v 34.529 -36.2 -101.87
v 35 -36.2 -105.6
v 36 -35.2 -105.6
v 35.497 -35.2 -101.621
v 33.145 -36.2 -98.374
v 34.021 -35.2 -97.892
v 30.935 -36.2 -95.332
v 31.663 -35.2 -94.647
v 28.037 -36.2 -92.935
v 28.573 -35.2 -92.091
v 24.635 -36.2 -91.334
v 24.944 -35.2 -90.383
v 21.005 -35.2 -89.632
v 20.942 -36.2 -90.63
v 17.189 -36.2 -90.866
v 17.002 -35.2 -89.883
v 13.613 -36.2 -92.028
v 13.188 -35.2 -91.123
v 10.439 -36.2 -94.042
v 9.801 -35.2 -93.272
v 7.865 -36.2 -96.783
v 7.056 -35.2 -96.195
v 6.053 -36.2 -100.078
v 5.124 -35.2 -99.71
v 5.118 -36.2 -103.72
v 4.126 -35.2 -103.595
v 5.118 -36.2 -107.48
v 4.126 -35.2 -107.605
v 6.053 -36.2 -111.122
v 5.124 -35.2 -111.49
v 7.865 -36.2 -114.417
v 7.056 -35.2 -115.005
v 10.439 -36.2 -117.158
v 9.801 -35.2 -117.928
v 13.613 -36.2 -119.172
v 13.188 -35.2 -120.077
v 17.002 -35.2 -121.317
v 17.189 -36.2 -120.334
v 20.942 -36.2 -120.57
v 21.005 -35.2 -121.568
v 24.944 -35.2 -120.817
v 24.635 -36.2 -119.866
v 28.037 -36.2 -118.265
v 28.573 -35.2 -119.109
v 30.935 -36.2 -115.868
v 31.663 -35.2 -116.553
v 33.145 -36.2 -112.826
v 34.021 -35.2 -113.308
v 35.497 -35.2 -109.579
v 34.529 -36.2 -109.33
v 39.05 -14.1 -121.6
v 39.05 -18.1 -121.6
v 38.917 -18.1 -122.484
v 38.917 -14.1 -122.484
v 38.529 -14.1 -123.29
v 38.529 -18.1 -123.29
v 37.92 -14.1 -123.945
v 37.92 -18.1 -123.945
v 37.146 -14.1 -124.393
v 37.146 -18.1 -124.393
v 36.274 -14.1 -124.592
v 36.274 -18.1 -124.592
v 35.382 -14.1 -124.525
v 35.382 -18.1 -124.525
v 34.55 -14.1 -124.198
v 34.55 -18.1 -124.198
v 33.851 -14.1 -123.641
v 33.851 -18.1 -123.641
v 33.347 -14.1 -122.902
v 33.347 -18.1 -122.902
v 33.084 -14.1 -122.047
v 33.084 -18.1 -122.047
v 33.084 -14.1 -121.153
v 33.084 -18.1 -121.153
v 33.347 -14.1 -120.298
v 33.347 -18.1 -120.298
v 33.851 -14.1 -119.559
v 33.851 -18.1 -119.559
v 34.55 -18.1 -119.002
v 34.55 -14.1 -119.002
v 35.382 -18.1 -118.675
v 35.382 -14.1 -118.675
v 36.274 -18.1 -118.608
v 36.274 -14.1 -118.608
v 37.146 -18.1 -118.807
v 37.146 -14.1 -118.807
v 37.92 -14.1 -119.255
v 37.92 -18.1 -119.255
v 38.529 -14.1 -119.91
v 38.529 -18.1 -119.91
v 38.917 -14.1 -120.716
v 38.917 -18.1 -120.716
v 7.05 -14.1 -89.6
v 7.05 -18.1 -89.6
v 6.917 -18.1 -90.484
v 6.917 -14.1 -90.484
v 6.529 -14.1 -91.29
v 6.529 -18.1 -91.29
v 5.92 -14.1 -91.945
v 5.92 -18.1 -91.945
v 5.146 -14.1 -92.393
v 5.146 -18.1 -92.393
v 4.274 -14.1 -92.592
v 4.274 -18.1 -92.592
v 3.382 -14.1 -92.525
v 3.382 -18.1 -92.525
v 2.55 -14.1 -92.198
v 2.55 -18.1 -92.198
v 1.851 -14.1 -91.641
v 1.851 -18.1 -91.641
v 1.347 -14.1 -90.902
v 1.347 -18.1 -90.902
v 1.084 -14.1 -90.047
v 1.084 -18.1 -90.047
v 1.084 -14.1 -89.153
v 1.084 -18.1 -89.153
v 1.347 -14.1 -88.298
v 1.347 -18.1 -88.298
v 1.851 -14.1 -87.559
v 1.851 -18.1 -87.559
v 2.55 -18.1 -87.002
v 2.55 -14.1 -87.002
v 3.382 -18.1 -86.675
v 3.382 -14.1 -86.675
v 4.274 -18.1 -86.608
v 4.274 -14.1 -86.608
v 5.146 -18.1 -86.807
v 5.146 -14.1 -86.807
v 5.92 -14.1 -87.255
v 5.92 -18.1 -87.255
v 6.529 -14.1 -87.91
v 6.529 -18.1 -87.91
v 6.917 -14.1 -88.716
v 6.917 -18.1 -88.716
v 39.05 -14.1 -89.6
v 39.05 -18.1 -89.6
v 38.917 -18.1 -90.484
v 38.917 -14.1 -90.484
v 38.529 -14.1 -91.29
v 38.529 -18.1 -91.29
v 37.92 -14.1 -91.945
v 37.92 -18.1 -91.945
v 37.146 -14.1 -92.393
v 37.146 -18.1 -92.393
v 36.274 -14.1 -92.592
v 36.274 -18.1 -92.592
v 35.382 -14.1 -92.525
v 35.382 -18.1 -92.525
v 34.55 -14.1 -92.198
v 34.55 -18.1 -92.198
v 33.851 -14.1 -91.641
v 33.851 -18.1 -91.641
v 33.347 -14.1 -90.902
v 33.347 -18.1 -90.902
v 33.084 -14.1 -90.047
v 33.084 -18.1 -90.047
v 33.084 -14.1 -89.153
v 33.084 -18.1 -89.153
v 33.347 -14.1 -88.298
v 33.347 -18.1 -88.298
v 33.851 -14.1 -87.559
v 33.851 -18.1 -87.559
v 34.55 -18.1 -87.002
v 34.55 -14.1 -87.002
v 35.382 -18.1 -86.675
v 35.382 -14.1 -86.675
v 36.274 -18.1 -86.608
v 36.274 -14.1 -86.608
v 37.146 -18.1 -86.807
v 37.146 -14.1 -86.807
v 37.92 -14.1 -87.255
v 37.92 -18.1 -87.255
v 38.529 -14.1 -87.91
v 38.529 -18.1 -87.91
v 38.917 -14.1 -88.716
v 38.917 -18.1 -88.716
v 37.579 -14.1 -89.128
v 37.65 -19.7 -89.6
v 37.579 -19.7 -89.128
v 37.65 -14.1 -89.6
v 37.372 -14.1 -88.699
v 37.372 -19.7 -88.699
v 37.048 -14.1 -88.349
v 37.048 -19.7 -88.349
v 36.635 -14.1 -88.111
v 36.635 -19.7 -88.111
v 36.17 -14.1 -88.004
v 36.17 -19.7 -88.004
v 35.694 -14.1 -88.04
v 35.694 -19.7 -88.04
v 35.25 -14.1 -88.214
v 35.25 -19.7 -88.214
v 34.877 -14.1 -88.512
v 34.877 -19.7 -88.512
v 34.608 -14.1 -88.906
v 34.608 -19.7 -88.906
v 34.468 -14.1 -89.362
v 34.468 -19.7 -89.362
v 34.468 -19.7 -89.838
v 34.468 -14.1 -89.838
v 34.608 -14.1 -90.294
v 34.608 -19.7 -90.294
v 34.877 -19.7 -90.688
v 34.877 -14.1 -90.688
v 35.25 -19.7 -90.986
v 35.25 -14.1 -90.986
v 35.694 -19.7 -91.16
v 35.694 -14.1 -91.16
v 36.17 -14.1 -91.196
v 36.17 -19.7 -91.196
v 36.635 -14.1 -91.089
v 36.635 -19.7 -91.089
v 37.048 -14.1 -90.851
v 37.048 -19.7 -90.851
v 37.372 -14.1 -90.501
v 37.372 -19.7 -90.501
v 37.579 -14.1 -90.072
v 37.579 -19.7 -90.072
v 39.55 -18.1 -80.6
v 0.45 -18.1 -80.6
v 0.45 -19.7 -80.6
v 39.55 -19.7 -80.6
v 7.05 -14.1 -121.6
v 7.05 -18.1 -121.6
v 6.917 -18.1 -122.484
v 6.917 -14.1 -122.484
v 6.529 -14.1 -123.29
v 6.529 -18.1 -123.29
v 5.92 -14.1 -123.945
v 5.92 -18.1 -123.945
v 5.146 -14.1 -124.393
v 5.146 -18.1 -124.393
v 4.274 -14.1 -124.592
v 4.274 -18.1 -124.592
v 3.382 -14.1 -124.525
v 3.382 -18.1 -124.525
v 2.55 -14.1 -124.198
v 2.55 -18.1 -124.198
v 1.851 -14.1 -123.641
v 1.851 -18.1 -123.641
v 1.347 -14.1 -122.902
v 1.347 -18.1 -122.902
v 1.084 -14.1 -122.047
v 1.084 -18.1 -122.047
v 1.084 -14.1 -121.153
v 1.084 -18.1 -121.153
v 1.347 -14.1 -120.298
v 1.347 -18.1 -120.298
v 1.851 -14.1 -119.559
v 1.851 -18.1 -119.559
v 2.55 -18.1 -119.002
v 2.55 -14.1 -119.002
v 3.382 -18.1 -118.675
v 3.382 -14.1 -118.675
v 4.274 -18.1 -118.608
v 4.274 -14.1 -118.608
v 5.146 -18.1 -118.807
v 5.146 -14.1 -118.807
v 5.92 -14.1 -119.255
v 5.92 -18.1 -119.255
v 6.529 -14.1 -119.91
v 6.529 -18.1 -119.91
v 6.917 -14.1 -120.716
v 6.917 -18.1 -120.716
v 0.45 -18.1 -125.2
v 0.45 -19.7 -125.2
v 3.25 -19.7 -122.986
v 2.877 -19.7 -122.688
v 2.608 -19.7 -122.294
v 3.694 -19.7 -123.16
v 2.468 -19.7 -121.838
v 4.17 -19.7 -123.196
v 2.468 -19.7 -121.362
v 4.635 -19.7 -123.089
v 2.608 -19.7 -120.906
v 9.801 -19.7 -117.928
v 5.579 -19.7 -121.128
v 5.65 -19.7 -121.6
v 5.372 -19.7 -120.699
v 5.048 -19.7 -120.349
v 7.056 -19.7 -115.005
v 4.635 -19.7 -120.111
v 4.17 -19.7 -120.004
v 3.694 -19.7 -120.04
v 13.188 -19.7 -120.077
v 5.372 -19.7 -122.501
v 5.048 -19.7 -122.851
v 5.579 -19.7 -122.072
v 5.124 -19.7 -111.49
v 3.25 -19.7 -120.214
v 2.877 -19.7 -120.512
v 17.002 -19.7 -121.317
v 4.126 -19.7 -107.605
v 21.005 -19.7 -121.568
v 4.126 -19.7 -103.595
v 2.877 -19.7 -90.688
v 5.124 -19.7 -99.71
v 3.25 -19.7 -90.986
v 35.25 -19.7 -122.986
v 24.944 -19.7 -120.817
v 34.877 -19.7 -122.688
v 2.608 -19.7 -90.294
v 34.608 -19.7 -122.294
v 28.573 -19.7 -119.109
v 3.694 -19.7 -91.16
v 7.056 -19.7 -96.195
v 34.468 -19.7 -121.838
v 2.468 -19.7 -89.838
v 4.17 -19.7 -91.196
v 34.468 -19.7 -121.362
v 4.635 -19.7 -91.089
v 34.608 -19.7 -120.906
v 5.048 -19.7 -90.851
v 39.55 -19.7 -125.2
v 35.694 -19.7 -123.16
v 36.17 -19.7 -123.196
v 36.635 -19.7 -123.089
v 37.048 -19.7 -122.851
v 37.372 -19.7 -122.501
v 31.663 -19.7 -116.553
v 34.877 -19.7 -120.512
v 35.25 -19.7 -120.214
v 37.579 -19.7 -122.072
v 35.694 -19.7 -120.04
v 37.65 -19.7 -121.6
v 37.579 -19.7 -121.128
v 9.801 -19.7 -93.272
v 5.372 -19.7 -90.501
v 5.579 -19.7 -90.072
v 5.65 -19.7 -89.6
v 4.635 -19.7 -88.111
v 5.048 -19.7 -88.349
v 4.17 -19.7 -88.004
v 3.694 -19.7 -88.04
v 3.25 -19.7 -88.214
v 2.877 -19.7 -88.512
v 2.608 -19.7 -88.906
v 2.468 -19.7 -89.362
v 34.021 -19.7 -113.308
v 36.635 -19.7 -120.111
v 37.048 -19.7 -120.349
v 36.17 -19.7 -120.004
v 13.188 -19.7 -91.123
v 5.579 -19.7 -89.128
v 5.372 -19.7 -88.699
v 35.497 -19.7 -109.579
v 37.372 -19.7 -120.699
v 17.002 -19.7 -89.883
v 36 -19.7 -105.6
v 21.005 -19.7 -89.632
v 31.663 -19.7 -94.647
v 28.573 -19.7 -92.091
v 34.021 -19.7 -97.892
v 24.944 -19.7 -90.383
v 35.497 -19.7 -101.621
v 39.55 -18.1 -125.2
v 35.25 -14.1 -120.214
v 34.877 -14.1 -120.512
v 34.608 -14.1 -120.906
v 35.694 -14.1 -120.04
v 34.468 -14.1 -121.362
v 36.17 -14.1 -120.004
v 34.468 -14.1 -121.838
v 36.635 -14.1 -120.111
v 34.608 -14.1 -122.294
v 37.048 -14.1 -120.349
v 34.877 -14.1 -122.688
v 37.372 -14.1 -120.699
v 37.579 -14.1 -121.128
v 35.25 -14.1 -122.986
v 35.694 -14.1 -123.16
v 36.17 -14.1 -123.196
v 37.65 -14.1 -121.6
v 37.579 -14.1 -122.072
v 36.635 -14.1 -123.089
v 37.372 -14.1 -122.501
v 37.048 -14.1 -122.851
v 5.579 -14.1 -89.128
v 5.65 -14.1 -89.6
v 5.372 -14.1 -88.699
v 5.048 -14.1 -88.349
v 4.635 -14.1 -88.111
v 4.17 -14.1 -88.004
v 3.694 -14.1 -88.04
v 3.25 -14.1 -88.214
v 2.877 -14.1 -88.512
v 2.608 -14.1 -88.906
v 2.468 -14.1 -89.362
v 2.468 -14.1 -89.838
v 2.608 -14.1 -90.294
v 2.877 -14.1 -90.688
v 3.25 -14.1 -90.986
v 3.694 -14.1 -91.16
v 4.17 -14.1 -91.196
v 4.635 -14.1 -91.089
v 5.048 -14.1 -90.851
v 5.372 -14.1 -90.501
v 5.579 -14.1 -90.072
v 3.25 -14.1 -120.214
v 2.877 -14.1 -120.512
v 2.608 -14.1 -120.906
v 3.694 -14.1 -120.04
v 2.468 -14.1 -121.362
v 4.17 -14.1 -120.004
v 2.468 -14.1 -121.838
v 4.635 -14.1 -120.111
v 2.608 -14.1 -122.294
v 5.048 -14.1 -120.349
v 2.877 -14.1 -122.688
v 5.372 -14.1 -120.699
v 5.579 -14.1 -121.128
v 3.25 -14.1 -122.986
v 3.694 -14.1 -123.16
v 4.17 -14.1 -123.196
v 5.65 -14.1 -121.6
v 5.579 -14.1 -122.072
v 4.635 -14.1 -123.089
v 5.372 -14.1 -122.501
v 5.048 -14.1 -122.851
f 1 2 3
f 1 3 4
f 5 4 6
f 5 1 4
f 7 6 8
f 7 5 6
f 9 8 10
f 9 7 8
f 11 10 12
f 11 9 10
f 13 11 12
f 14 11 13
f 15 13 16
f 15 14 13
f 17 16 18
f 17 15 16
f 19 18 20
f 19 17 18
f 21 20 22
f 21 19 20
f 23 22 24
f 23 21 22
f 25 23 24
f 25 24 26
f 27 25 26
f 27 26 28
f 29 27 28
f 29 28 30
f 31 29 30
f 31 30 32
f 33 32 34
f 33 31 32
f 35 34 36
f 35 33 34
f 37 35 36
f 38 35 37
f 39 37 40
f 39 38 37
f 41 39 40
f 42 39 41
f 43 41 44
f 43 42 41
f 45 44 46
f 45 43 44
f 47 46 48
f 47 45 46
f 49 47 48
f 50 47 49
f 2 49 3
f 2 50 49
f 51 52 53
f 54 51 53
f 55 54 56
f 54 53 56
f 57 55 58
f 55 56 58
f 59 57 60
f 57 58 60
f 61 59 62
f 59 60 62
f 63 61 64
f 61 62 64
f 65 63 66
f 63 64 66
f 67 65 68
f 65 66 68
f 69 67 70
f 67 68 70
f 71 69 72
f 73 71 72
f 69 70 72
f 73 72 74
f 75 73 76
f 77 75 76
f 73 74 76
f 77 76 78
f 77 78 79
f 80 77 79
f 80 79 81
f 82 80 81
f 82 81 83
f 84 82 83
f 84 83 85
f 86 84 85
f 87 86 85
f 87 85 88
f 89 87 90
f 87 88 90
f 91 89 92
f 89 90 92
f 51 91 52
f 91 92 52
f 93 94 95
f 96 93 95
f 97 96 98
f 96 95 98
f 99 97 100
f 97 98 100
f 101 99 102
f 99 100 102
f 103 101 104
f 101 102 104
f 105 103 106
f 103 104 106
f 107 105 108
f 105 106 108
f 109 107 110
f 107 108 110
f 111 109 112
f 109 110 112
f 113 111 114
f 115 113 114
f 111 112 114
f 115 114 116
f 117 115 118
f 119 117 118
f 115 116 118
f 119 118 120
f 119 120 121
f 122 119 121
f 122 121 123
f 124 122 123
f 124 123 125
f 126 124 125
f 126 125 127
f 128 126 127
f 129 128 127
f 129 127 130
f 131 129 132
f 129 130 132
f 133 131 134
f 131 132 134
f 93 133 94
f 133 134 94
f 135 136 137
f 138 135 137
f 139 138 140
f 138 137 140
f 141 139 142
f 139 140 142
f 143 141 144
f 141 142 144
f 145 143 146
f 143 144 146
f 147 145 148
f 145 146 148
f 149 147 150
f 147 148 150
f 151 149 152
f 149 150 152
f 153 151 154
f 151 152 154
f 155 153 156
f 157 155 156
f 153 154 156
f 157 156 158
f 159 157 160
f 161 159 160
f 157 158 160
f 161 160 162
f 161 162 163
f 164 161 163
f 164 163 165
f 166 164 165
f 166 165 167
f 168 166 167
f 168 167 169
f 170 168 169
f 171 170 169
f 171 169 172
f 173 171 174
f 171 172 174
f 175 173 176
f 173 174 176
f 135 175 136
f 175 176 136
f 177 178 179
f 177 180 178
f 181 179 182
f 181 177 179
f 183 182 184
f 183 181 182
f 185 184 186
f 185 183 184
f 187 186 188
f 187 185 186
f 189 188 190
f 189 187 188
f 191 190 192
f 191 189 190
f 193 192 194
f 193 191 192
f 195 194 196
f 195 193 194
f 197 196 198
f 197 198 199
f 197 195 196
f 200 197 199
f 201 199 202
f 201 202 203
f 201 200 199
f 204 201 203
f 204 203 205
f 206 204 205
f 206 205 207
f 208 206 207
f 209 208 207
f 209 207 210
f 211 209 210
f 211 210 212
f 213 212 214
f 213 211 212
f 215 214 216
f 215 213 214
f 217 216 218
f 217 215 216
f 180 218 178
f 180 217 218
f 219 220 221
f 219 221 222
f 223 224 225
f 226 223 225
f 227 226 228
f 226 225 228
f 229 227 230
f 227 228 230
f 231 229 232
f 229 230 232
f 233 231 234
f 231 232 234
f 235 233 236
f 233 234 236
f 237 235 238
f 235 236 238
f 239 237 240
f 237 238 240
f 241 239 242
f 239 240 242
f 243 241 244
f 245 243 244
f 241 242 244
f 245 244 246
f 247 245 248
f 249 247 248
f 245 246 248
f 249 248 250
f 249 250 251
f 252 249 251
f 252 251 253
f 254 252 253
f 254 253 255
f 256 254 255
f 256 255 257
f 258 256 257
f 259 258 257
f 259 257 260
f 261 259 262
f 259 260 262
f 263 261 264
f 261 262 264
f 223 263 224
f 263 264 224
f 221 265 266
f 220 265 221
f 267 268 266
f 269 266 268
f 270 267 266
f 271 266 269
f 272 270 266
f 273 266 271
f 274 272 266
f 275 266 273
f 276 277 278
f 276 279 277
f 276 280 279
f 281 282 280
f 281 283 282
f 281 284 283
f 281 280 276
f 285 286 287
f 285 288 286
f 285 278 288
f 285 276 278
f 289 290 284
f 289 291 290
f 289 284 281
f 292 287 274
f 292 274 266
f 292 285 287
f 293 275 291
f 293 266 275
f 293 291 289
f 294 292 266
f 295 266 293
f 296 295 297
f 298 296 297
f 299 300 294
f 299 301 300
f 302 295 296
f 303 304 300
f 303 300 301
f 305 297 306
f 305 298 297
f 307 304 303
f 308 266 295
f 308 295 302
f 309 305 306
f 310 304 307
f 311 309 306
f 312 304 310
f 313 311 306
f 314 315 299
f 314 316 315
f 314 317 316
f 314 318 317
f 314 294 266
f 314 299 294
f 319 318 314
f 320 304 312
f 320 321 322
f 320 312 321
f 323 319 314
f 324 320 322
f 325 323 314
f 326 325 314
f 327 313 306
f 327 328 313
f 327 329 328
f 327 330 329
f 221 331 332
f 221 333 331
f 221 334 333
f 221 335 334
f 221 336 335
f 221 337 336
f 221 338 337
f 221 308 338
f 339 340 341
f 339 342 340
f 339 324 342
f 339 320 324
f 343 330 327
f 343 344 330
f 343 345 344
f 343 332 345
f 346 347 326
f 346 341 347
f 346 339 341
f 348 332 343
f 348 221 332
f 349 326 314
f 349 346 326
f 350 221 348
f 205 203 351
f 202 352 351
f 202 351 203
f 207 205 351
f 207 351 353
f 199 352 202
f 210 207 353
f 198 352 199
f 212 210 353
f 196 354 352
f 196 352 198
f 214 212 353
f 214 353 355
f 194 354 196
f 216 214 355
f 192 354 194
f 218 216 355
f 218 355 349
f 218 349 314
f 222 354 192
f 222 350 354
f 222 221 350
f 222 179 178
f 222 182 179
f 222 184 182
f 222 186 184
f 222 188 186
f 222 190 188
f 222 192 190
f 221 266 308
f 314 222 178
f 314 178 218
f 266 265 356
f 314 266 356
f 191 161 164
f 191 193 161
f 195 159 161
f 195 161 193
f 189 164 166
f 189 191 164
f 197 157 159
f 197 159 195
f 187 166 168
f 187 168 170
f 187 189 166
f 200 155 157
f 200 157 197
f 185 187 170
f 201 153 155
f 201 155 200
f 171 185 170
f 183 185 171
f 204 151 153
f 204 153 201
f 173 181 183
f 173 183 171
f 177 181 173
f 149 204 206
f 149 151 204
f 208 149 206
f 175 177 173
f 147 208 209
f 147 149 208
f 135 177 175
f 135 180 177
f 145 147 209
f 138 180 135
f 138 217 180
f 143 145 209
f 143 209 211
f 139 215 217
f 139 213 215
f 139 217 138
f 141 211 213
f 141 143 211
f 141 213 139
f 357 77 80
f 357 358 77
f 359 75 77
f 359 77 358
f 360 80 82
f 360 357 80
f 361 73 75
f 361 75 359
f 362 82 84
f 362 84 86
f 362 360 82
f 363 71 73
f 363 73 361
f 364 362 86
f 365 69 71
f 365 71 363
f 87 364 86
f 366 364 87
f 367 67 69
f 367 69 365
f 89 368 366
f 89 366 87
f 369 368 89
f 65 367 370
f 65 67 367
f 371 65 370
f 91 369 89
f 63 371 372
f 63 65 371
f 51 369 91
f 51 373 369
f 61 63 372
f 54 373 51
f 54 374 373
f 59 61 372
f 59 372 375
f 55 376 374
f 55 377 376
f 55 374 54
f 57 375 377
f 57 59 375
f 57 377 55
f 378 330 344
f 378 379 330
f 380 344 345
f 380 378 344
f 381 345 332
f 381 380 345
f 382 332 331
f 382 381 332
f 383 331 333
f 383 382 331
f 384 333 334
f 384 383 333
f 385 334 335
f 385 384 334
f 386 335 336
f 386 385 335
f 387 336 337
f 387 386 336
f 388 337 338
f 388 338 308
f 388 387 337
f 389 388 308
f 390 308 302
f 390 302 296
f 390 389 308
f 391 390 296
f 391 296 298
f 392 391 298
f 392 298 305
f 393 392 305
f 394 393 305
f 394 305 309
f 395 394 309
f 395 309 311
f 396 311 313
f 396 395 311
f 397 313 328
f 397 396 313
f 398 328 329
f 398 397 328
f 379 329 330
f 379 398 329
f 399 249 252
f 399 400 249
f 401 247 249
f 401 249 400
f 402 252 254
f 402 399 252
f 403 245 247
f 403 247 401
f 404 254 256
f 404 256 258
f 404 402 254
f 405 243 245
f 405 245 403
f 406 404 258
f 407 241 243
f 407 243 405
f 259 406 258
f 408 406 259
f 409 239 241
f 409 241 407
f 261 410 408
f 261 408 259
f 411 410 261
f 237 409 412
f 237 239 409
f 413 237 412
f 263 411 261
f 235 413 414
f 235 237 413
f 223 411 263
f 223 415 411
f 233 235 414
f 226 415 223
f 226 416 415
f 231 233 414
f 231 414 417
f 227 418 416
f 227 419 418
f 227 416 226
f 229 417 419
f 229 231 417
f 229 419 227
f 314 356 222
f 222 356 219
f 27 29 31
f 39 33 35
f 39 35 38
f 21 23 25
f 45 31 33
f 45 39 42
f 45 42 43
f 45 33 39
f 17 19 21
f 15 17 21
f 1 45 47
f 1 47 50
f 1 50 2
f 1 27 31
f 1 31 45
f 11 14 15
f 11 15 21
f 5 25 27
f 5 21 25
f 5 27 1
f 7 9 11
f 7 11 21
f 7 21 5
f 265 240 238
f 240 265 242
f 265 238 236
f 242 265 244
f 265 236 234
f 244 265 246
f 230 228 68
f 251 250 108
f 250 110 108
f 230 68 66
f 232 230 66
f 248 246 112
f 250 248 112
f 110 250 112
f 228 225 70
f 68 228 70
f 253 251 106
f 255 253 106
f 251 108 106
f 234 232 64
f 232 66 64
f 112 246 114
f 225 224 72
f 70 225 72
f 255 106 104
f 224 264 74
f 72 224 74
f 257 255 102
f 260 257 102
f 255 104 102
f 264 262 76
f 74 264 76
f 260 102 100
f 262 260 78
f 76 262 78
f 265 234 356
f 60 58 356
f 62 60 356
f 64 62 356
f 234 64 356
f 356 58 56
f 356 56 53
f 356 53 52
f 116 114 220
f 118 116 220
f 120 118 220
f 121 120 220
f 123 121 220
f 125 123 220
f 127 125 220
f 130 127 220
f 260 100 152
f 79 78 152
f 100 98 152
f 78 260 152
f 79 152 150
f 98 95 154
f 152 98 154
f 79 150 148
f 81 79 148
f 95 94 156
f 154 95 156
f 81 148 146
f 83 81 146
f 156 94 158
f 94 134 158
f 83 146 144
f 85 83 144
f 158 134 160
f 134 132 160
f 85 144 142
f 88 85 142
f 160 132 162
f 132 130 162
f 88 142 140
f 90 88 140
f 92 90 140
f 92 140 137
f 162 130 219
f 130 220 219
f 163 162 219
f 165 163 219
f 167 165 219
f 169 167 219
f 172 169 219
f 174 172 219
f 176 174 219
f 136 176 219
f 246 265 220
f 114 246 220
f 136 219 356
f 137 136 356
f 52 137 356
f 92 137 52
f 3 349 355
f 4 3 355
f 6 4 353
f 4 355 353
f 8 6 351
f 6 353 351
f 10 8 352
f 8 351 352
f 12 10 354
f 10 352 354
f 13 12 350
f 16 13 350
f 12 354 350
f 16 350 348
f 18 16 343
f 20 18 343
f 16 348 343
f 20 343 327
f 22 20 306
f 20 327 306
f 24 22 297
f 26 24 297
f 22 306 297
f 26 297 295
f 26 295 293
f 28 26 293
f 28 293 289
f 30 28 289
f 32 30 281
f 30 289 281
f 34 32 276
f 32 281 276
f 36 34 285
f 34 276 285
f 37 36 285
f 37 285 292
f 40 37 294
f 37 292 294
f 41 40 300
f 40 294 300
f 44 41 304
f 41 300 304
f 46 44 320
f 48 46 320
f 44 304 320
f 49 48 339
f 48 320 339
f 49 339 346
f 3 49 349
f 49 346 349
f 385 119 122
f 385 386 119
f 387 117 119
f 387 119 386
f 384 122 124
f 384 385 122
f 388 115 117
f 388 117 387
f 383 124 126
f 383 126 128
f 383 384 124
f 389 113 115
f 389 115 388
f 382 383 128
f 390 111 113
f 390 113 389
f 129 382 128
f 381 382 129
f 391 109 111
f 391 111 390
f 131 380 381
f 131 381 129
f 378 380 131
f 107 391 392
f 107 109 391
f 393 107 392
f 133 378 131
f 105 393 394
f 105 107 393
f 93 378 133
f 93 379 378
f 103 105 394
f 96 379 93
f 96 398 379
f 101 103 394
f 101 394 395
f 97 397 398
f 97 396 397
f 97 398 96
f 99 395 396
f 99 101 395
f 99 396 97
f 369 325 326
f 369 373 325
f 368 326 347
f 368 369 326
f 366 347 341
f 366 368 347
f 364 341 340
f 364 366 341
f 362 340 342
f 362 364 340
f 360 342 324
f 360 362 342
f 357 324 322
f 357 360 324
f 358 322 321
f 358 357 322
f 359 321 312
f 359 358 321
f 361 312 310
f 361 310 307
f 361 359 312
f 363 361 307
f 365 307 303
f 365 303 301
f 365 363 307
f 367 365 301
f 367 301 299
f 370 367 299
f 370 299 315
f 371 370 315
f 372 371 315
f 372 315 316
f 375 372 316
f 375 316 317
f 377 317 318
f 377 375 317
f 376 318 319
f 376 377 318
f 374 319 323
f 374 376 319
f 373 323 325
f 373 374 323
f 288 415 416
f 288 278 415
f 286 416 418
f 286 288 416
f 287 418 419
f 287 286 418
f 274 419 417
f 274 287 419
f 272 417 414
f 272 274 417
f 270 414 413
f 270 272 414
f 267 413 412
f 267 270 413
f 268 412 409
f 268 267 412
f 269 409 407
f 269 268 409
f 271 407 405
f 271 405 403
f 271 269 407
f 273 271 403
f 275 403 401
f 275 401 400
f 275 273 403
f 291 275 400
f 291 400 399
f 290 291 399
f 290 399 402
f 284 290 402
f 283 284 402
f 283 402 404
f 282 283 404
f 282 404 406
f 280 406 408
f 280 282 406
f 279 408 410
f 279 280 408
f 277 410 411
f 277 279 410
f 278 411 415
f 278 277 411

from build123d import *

# Parameters (mm, degrees)
SKETCH011_W     = 39.1
SKETCH011_H     = 44.6
SKETCH011_R     = 1.6
PAD007_DEPTH    = 1.6
SKETCH012_R     = 16
PAD008_DEPTH    = 16.5
SKETCH013_R     = 3
SKETCH013_R_2   = 1.6
PAD009_DEPTH    = 4
CHAMFER001_SIZE = 1


with BuildPart() as part:
    # Sketch011 → Pad007 (new body)
    with BuildSketch(Plane.XZ):
        Rectangle(SKETCH011_W, SKETCH011_H)
        with Locations((-15.95, 13.3)):
            Circle(SKETCH011_R, mode=Mode.SUBTRACT)
        with Locations((16.05, 13.3)):
            Circle(SKETCH011_R, mode=Mode.SUBTRACT)
        with Locations((16.05, -18.7)):
            Circle(SKETCH011_R, mode=Mode.SUBTRACT)
        with Locations((-15.95, -18.7)):
            Circle(SKETCH011_R, mode=Mode.SUBTRACT)
    extrude(amount=PAD007_DEPTH)

    # Sketch012 (on Face10 of Pad007) → Pad008 (join)
    with BuildSketch(Plane.XZ.offset(1.6)):
        with Locations((0, -2.7)):
            Circle(SKETCH012_R)
    extrude(amount=PAD008_DEPTH)

    # Sketch013 (on Face4 of Pad008) → Pad009 (join)
    with BuildSketch(Plane(origin=(0, 0, 0), x_dir=(1, 0, 0), z_dir=(0, 1, 0))):
        with Locations((-15.95, 18.7)):
            Circle(SKETCH013_R)
        with Locations((-15.95, 18.7)):
            Circle(SKETCH013_R_2, mode=Mode.SUBTRACT)
        with Locations((16.05, 18.7)):
            Circle(SKETCH013_R)
        with Locations((16.05, 18.7)):
            Circle(SKETCH013_R_2, mode=Mode.SUBTRACT)
        with Locations((16.05, -13.3)):
            Circle(SKETCH013_R)
        with Locations((16.05, -13.3)):
            Circle(SKETCH013_R_2, mode=Mode.SUBTRACT)
        with Locations((-15.95, -13.3)):
            Circle(SKETCH013_R)
        with Locations((-15.95, -13.3)):
            Circle(SKETCH013_R_2, mode=Mode.SUBTRACT)
    extrude(amount=PAD009_DEPTH)

    # Chamfer001
    chamfer001_edges = [part.edges().sort_by_distance(p)[0] for p in [
        (-16, -18.1, -2.7),
    ]]
    chamfer(chamfer001_edges, length=CHAMFER001_SIZE)


with BuildPart() as part_1:
    # Body008 placement: moved
    add(part.part.moved(Location((-20, -18.1, -102.9))))


with BuildPart() as part_2:
    # Clone placement: moved
    add(part_1.part.moved(Location((40, 0, 0))))


solid = part_2.part
